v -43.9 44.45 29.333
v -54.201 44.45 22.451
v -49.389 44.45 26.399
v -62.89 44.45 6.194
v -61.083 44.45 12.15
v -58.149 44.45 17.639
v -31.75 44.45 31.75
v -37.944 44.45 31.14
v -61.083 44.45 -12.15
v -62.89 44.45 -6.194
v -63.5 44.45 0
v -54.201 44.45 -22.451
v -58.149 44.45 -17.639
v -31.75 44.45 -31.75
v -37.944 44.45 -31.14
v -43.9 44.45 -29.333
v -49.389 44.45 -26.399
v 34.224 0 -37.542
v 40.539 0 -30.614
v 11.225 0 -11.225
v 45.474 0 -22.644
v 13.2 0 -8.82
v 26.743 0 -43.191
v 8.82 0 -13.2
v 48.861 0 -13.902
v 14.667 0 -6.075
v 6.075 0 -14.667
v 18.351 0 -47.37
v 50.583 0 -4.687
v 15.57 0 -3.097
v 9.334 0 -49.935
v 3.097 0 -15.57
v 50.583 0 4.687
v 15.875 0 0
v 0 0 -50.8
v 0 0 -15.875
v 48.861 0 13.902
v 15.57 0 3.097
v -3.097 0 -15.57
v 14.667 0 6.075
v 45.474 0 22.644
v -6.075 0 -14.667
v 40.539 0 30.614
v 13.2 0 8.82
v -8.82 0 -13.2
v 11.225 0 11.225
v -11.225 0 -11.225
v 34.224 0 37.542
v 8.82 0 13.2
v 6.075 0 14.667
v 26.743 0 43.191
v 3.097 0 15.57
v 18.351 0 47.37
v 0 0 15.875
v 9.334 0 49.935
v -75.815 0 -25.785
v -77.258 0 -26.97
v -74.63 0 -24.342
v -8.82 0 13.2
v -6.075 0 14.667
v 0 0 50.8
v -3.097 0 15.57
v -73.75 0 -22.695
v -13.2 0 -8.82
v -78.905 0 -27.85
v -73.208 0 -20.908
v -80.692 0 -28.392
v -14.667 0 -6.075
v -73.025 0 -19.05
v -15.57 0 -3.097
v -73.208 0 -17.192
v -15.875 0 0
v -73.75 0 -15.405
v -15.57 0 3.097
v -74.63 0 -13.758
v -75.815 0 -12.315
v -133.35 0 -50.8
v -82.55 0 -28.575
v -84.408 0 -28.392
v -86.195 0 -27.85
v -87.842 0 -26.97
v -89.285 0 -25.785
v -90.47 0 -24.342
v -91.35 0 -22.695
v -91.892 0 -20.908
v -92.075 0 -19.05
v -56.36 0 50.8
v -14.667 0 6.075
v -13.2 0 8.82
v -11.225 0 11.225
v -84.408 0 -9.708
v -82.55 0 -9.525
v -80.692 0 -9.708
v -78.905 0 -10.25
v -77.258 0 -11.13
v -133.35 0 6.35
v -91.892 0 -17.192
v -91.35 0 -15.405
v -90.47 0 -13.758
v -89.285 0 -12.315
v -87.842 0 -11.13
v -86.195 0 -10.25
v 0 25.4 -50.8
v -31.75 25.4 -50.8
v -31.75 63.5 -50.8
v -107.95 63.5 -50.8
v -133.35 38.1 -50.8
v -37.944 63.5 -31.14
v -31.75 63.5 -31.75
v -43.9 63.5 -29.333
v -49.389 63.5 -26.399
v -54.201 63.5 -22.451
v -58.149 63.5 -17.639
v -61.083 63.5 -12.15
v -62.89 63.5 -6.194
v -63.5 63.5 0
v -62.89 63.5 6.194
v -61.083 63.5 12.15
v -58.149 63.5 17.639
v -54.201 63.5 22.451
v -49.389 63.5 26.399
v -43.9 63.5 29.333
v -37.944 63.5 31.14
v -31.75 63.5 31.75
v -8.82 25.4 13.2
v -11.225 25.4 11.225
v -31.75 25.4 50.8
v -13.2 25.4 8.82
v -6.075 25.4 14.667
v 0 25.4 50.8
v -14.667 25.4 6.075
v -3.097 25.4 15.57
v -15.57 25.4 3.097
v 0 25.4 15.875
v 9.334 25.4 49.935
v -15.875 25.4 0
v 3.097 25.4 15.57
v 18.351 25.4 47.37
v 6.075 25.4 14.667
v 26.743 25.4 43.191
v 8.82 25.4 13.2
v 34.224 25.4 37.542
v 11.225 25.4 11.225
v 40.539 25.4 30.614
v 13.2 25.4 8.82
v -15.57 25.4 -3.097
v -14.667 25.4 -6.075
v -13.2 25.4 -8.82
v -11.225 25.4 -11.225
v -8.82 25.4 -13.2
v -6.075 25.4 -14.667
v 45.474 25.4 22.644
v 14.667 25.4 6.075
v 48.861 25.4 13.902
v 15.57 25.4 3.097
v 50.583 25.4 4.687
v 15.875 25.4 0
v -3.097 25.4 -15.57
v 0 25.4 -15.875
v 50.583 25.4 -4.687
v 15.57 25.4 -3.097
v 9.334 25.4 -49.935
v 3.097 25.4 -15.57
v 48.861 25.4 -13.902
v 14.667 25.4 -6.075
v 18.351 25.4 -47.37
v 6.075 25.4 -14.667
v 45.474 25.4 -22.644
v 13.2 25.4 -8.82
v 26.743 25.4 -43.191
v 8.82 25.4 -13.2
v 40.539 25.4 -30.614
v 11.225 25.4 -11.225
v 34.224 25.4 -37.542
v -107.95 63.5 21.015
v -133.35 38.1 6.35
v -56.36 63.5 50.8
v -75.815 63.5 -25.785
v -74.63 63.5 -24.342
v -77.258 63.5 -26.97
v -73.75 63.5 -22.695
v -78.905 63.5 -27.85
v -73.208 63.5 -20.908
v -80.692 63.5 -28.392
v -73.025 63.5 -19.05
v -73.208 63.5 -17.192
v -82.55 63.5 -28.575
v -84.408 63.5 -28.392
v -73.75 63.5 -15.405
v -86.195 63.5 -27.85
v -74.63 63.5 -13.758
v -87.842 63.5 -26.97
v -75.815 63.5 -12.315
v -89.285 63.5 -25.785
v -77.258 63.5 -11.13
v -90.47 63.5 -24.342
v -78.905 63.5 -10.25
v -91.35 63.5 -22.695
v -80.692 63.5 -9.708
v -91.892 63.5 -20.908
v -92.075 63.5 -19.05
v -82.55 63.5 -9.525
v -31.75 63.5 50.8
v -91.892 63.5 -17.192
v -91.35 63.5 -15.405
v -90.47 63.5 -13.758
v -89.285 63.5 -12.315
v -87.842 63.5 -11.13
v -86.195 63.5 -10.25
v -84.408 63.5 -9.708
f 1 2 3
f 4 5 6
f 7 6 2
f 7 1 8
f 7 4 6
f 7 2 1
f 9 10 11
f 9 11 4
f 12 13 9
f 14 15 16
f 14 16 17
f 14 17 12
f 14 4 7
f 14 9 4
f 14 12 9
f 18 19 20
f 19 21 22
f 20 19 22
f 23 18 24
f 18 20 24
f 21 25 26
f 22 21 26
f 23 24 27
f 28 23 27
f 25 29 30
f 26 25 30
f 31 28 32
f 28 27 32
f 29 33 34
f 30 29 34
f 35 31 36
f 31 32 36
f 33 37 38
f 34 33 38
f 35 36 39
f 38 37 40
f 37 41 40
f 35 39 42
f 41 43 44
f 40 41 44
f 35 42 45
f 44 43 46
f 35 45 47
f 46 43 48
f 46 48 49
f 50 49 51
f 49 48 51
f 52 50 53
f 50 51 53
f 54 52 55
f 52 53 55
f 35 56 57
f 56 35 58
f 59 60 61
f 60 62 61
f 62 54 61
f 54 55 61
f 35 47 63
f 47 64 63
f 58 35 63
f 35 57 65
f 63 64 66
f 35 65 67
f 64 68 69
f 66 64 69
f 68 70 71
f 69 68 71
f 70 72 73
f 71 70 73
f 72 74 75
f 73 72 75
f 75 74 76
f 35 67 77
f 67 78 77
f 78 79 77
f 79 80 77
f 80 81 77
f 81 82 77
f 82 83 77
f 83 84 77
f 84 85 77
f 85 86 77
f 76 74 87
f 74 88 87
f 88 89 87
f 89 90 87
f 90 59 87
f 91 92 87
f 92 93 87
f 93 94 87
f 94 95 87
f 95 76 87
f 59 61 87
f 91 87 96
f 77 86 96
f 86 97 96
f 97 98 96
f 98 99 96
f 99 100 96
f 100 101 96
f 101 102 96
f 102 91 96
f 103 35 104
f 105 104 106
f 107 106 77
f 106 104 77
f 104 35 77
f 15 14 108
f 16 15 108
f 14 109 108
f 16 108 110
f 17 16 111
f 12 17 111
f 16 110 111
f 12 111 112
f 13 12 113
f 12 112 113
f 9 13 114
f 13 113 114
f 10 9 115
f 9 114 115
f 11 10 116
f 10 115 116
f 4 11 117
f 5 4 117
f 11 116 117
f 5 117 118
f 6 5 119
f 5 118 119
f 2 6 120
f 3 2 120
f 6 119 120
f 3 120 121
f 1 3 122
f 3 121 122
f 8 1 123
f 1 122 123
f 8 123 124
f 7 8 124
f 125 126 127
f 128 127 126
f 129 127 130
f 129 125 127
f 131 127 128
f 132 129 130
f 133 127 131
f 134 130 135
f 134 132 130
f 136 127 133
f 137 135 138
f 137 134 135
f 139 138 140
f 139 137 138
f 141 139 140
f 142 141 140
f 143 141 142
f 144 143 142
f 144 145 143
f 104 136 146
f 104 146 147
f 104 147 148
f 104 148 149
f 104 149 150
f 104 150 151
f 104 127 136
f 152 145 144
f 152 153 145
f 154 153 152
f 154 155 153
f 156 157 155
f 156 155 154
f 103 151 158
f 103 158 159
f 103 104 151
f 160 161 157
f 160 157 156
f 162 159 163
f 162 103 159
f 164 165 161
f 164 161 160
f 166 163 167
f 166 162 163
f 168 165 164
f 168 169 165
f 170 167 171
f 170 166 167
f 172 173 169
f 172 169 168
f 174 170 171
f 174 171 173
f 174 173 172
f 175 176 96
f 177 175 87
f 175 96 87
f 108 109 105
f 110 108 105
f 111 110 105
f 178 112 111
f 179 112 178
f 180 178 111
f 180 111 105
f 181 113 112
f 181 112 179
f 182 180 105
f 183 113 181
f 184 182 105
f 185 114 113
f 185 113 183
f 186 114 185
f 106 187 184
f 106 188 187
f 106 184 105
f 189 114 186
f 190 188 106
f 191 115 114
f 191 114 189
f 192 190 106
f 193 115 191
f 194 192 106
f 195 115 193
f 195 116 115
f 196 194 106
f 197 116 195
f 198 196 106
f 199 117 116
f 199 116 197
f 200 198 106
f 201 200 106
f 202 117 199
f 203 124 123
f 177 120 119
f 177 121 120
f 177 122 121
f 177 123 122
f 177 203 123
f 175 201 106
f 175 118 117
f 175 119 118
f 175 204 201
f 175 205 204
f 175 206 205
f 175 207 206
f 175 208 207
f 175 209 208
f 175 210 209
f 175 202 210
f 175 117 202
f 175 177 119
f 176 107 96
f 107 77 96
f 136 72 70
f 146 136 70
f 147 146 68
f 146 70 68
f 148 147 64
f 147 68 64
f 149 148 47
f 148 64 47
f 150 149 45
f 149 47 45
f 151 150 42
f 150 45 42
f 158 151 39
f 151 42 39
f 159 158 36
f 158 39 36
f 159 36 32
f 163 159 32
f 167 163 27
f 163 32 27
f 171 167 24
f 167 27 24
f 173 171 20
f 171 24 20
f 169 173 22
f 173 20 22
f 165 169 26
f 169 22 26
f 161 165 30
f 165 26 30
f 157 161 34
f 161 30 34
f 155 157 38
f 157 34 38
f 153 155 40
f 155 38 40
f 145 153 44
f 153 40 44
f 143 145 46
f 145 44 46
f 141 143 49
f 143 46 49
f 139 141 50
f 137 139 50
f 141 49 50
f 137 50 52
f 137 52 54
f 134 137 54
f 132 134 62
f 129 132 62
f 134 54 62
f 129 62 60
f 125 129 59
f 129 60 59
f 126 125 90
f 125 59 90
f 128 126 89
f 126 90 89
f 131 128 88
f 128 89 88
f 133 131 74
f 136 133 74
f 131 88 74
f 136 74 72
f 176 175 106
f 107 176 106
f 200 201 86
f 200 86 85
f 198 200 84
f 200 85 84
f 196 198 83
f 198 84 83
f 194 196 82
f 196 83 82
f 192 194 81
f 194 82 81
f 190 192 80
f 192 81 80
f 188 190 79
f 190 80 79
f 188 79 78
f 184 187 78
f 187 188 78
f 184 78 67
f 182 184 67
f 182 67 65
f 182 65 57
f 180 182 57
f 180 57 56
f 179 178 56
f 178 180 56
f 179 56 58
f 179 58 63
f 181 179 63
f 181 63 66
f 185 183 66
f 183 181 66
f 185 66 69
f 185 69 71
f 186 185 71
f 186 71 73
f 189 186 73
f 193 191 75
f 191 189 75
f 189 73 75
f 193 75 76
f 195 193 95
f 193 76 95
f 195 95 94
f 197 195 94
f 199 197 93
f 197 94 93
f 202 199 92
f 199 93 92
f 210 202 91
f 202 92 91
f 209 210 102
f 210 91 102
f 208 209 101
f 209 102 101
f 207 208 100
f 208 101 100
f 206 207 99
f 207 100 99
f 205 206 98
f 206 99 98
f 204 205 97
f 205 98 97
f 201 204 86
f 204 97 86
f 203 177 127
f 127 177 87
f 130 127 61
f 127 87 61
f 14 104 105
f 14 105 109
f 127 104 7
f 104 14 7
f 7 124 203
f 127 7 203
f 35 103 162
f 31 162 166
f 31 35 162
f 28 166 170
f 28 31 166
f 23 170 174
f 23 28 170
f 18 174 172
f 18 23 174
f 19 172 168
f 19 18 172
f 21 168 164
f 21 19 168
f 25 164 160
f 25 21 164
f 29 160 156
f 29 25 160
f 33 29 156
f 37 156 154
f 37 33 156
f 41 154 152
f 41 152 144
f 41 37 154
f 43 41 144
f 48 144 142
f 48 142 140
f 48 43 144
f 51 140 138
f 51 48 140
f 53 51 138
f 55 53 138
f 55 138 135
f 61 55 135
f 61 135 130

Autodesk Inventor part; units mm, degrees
ref_plane "YZ Plane" through (0, 0, 0) normal (1, 0, 0) x (0, 1, 0)
ref_plane "XZ Plane" through (0, 0, 0) normal (0, 1, 0) x (-1, 0, 0)
ref_plane "XY Plane" through (0, 0, 0) normal (0, 0, 1) x (1, 0, 0)
sketch "Sketch1" plane through (0, 0, 0) normal (0, 1, 0) x (-1, 0, 0)
  circle A0 centre (0, 0) radius 15.875
  circle A1 centre (0, 0) radius 50.8
  line L0 (0, -50.8) -> (133.35, -50.8)
  line L1 (133.35, -50.8) -> (133.35, 6.35)
  line L2 (133.35, 6.35) -> (56.3603, 50.8)
  line L3 (56.3603, 50.8) -> (0, 50.8)
  circle A2 centre (82.55, -19.05) radius 9.525
  dimension "d0" = 101.6
  dimension "d1" = 133.35
  dimension "d4" = 60
  dimension "d5" = 57.15
  dimension "d6" = 31.75
  dimension "d7" = 19.05
  dimension "d8" = 31.75
  dimension "d9" = 82.55
extrude "MAIN BLOCK" add sketch "Sketch1" along normal blind 63.5
sketch "Sketch2" plane through (0, 63.5, 0) normal (0, 1, 0) x (1, 0, 0)
  line L0 (-31.75, -50.8) -> (50.8, -50.8)
  line L1 (50.8, -50.8) -> (50.8, 50.8)
  line L2 (50.8, 50.8) -> (-31.75, 50.8)
  line L3 (-31.75, 50.8) -> (-31.75, -50.8)
  arc A0 (0, -50.8) -> (0, 50.8) centre (0, 0) ccw projected
  line L4 (0, 50.8) -> (-133.35, 50.8) projected
  line L5 (-56.3603, -50.8) -> (0, -50.8) projected
  point P0 (0, 50.8)
  dimension "d12" = 31.75
extrude "SQUARE CUTOUT" cut sketch "Sketch2" against normal blind 38.1 contours L3 L2 A0 L0
sketch "Sketch3" plane through (0, 63.5, 0) normal (0, 1, 0) x (1, 0, 0)
  line L0 (-31.75, -50.8) -> (-31.75, 50.8) projected
  circle A0 centre (-31.75, 0) radius 31.75
  point P0 (0, 0)
  point P1 (-31.75, 31.75)
  point P2 (-31.75, -31.75)
  dimension "d15" = 63.5
extrude "HALF CIRCLE CUTOUT" cut sketch "Sketch3" against normal blind 19.05 contours A0 L0 picked at (-42.2562, -1.2757)
chamfer "REAR CHAMFER" distance 25.4 angle 45 1 edges at (-133.35, 63.5, -22.225)
properties part number "ANS8-2-BK" material "Bronze, Cast"
